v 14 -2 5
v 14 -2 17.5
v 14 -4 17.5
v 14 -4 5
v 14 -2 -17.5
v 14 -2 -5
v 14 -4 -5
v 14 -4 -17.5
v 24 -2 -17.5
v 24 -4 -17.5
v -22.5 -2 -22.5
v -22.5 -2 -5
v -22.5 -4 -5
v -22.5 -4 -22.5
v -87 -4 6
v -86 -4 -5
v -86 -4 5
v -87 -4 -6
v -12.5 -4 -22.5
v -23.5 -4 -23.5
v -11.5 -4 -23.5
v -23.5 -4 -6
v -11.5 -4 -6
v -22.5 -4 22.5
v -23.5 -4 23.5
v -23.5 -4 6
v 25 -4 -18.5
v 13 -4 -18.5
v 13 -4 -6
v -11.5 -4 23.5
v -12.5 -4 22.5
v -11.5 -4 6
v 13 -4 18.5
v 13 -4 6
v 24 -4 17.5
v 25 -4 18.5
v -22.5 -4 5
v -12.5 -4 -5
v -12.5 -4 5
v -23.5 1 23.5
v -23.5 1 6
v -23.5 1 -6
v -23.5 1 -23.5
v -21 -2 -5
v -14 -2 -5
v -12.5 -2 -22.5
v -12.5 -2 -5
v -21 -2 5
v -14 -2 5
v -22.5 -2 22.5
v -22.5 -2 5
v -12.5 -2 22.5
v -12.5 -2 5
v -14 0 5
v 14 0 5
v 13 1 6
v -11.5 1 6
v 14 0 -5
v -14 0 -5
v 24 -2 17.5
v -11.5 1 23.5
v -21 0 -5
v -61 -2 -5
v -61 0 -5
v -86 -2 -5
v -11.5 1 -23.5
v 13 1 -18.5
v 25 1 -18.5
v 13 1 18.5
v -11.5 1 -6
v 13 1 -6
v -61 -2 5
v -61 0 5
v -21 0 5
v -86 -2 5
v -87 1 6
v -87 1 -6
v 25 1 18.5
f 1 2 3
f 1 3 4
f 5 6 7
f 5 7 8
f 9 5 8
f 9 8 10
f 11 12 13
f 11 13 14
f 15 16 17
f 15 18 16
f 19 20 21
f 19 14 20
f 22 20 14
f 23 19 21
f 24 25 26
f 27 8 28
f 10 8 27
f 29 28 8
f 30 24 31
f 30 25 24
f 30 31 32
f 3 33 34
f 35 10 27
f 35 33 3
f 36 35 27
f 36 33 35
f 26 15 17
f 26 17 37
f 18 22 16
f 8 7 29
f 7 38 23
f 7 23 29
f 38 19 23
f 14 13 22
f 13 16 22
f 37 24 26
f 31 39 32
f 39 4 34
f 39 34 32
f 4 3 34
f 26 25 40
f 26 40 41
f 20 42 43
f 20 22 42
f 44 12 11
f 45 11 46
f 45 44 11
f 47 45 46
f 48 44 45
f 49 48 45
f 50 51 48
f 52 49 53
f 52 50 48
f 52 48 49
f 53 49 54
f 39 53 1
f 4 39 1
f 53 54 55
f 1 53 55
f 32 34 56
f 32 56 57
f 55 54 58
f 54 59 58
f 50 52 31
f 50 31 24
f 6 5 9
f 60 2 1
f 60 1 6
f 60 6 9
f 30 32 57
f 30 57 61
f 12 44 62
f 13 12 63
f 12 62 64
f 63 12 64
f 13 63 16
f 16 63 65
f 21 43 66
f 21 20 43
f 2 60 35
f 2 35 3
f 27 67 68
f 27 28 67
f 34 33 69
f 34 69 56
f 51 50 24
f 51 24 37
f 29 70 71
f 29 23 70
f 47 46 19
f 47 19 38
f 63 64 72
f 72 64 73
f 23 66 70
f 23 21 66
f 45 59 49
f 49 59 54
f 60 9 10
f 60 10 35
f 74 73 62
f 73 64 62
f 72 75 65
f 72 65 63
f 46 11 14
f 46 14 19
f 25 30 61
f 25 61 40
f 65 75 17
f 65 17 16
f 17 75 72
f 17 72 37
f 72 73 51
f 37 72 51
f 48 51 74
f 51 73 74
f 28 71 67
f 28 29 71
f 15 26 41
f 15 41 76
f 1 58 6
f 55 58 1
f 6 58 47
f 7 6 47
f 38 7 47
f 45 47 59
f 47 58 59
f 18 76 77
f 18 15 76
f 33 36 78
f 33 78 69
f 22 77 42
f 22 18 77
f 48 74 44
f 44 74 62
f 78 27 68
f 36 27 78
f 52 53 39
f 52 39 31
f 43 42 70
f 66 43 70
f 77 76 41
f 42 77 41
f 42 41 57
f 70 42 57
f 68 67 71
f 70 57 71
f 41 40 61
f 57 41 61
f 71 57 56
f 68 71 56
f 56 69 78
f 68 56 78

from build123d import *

# Parameters (mm, degrees)
SKETCH_3_W           = 10
SKETCH_3_H           = 35
SKETCH_3_W_2         = 26.5
SKETCH_3_H_2         = 10
SKETCH_3_W_3         = 38.5
SKETCH_3_W_4         = 25
EXTRUDE_1_DEPTH      = 1
EXTRUDE_2_DEPTH      = 4
EXTRUDE_2_DEPTH_BACK = 1
SKETCH_5_W           = 25
SKETCH_5_H           = 10
SKETCH_5_W_2         = 10
SKETCH_5_H_2         = 35
EXTRUDE_3_DEPTH      = 2


with BuildPart() as part:
    # 草图3 → 凸台-拉伸1 (new body)
    with BuildSketch(Plane(origin=(0, 0, 0), x_dir=(1, 0, 0), z_dir=(0, 1, 0))):
        with Locations((19, 0)):
            Rectangle(SKETCH_3_W, SKETCH_3_H)
        with Locations((0.75, 0)):
            Rectangle(SKETCH_3_W_2, SKETCH_3_H_2)
        Polygon((-12.5, -5), (-12.5, 5), (-12.5, 22.5), (-22.5, 22.5), (-22.5, 5), (-22.5, -5), (-22.5, -22.5), (-12.5, -22.5), align=None)
        with Locations((-41.75, 0)):
            Rectangle(SKETCH_3_W_3, SKETCH_3_H_2)
        with Locations((-73.5, 0)):
            Rectangle(SKETCH_3_W_4, SKETCH_3_H_2)
    extrude(amount=EXTRUDE_1_DEPTH)

    # 草图4 → 凸台-拉伸2 (add, two sides)
    with BuildSketch(Plane.XZ) as extrude_2_sk:
        Polygon((13, -18.5), (25, -18.5), (25, 18.5), (13, 18.5), (13, 6), (-11.5, 6), (-11.5, 23.5), (-23.5, 23.5), (-23.5, 6), (-87, 6), (-87, -6), (-23.5, -6), (-23.5, -23.5), (-11.5, -23.5), (-11.5, -6), (13, -6), align=None)
        Polygon((14, -17.5), (24, -17.5), (24, 17.5), (14, 17.5), (14, 5), (-12.5, 5), (-12.5, 22.5), (-22.5, 22.5), (-22.5, 5), (-86, 5), (-86, -5), (-22.5, -5), (-22.5, -22.5), (-12.5, -22.5), (-12.5, -5), (14, -5), align=None, mode=Mode.SUBTRACT)
    extrude(amount=EXTRUDE_2_DEPTH)
    extrude(extrude_2_sk.sketch, amount=-EXTRUDE_2_DEPTH_BACK)

    # 草图5 → 凸台-拉伸3 (add)
    with BuildSketch(Plane.XZ):
        Polygon((-22.5, 22.5), (-22.5, 5), (-21, 5), (-21, -5), (-22.5, -5), (-22.5, -22.5), (-12.5, -22.5), (-12.5, -5), (-14, -5), (-14, 5), (-12.5, 5), (-12.5, 22.5), align=None)
        with Locations((-73.5, 0)):
            Rectangle(SKETCH_5_W, SKETCH_5_H)
        with Locations((19, 0)):
            Rectangle(SKETCH_5_W_2, SKETCH_5_H_2)
    extrude(amount=EXTRUDE_3_DEPTH)


solid = part.part
